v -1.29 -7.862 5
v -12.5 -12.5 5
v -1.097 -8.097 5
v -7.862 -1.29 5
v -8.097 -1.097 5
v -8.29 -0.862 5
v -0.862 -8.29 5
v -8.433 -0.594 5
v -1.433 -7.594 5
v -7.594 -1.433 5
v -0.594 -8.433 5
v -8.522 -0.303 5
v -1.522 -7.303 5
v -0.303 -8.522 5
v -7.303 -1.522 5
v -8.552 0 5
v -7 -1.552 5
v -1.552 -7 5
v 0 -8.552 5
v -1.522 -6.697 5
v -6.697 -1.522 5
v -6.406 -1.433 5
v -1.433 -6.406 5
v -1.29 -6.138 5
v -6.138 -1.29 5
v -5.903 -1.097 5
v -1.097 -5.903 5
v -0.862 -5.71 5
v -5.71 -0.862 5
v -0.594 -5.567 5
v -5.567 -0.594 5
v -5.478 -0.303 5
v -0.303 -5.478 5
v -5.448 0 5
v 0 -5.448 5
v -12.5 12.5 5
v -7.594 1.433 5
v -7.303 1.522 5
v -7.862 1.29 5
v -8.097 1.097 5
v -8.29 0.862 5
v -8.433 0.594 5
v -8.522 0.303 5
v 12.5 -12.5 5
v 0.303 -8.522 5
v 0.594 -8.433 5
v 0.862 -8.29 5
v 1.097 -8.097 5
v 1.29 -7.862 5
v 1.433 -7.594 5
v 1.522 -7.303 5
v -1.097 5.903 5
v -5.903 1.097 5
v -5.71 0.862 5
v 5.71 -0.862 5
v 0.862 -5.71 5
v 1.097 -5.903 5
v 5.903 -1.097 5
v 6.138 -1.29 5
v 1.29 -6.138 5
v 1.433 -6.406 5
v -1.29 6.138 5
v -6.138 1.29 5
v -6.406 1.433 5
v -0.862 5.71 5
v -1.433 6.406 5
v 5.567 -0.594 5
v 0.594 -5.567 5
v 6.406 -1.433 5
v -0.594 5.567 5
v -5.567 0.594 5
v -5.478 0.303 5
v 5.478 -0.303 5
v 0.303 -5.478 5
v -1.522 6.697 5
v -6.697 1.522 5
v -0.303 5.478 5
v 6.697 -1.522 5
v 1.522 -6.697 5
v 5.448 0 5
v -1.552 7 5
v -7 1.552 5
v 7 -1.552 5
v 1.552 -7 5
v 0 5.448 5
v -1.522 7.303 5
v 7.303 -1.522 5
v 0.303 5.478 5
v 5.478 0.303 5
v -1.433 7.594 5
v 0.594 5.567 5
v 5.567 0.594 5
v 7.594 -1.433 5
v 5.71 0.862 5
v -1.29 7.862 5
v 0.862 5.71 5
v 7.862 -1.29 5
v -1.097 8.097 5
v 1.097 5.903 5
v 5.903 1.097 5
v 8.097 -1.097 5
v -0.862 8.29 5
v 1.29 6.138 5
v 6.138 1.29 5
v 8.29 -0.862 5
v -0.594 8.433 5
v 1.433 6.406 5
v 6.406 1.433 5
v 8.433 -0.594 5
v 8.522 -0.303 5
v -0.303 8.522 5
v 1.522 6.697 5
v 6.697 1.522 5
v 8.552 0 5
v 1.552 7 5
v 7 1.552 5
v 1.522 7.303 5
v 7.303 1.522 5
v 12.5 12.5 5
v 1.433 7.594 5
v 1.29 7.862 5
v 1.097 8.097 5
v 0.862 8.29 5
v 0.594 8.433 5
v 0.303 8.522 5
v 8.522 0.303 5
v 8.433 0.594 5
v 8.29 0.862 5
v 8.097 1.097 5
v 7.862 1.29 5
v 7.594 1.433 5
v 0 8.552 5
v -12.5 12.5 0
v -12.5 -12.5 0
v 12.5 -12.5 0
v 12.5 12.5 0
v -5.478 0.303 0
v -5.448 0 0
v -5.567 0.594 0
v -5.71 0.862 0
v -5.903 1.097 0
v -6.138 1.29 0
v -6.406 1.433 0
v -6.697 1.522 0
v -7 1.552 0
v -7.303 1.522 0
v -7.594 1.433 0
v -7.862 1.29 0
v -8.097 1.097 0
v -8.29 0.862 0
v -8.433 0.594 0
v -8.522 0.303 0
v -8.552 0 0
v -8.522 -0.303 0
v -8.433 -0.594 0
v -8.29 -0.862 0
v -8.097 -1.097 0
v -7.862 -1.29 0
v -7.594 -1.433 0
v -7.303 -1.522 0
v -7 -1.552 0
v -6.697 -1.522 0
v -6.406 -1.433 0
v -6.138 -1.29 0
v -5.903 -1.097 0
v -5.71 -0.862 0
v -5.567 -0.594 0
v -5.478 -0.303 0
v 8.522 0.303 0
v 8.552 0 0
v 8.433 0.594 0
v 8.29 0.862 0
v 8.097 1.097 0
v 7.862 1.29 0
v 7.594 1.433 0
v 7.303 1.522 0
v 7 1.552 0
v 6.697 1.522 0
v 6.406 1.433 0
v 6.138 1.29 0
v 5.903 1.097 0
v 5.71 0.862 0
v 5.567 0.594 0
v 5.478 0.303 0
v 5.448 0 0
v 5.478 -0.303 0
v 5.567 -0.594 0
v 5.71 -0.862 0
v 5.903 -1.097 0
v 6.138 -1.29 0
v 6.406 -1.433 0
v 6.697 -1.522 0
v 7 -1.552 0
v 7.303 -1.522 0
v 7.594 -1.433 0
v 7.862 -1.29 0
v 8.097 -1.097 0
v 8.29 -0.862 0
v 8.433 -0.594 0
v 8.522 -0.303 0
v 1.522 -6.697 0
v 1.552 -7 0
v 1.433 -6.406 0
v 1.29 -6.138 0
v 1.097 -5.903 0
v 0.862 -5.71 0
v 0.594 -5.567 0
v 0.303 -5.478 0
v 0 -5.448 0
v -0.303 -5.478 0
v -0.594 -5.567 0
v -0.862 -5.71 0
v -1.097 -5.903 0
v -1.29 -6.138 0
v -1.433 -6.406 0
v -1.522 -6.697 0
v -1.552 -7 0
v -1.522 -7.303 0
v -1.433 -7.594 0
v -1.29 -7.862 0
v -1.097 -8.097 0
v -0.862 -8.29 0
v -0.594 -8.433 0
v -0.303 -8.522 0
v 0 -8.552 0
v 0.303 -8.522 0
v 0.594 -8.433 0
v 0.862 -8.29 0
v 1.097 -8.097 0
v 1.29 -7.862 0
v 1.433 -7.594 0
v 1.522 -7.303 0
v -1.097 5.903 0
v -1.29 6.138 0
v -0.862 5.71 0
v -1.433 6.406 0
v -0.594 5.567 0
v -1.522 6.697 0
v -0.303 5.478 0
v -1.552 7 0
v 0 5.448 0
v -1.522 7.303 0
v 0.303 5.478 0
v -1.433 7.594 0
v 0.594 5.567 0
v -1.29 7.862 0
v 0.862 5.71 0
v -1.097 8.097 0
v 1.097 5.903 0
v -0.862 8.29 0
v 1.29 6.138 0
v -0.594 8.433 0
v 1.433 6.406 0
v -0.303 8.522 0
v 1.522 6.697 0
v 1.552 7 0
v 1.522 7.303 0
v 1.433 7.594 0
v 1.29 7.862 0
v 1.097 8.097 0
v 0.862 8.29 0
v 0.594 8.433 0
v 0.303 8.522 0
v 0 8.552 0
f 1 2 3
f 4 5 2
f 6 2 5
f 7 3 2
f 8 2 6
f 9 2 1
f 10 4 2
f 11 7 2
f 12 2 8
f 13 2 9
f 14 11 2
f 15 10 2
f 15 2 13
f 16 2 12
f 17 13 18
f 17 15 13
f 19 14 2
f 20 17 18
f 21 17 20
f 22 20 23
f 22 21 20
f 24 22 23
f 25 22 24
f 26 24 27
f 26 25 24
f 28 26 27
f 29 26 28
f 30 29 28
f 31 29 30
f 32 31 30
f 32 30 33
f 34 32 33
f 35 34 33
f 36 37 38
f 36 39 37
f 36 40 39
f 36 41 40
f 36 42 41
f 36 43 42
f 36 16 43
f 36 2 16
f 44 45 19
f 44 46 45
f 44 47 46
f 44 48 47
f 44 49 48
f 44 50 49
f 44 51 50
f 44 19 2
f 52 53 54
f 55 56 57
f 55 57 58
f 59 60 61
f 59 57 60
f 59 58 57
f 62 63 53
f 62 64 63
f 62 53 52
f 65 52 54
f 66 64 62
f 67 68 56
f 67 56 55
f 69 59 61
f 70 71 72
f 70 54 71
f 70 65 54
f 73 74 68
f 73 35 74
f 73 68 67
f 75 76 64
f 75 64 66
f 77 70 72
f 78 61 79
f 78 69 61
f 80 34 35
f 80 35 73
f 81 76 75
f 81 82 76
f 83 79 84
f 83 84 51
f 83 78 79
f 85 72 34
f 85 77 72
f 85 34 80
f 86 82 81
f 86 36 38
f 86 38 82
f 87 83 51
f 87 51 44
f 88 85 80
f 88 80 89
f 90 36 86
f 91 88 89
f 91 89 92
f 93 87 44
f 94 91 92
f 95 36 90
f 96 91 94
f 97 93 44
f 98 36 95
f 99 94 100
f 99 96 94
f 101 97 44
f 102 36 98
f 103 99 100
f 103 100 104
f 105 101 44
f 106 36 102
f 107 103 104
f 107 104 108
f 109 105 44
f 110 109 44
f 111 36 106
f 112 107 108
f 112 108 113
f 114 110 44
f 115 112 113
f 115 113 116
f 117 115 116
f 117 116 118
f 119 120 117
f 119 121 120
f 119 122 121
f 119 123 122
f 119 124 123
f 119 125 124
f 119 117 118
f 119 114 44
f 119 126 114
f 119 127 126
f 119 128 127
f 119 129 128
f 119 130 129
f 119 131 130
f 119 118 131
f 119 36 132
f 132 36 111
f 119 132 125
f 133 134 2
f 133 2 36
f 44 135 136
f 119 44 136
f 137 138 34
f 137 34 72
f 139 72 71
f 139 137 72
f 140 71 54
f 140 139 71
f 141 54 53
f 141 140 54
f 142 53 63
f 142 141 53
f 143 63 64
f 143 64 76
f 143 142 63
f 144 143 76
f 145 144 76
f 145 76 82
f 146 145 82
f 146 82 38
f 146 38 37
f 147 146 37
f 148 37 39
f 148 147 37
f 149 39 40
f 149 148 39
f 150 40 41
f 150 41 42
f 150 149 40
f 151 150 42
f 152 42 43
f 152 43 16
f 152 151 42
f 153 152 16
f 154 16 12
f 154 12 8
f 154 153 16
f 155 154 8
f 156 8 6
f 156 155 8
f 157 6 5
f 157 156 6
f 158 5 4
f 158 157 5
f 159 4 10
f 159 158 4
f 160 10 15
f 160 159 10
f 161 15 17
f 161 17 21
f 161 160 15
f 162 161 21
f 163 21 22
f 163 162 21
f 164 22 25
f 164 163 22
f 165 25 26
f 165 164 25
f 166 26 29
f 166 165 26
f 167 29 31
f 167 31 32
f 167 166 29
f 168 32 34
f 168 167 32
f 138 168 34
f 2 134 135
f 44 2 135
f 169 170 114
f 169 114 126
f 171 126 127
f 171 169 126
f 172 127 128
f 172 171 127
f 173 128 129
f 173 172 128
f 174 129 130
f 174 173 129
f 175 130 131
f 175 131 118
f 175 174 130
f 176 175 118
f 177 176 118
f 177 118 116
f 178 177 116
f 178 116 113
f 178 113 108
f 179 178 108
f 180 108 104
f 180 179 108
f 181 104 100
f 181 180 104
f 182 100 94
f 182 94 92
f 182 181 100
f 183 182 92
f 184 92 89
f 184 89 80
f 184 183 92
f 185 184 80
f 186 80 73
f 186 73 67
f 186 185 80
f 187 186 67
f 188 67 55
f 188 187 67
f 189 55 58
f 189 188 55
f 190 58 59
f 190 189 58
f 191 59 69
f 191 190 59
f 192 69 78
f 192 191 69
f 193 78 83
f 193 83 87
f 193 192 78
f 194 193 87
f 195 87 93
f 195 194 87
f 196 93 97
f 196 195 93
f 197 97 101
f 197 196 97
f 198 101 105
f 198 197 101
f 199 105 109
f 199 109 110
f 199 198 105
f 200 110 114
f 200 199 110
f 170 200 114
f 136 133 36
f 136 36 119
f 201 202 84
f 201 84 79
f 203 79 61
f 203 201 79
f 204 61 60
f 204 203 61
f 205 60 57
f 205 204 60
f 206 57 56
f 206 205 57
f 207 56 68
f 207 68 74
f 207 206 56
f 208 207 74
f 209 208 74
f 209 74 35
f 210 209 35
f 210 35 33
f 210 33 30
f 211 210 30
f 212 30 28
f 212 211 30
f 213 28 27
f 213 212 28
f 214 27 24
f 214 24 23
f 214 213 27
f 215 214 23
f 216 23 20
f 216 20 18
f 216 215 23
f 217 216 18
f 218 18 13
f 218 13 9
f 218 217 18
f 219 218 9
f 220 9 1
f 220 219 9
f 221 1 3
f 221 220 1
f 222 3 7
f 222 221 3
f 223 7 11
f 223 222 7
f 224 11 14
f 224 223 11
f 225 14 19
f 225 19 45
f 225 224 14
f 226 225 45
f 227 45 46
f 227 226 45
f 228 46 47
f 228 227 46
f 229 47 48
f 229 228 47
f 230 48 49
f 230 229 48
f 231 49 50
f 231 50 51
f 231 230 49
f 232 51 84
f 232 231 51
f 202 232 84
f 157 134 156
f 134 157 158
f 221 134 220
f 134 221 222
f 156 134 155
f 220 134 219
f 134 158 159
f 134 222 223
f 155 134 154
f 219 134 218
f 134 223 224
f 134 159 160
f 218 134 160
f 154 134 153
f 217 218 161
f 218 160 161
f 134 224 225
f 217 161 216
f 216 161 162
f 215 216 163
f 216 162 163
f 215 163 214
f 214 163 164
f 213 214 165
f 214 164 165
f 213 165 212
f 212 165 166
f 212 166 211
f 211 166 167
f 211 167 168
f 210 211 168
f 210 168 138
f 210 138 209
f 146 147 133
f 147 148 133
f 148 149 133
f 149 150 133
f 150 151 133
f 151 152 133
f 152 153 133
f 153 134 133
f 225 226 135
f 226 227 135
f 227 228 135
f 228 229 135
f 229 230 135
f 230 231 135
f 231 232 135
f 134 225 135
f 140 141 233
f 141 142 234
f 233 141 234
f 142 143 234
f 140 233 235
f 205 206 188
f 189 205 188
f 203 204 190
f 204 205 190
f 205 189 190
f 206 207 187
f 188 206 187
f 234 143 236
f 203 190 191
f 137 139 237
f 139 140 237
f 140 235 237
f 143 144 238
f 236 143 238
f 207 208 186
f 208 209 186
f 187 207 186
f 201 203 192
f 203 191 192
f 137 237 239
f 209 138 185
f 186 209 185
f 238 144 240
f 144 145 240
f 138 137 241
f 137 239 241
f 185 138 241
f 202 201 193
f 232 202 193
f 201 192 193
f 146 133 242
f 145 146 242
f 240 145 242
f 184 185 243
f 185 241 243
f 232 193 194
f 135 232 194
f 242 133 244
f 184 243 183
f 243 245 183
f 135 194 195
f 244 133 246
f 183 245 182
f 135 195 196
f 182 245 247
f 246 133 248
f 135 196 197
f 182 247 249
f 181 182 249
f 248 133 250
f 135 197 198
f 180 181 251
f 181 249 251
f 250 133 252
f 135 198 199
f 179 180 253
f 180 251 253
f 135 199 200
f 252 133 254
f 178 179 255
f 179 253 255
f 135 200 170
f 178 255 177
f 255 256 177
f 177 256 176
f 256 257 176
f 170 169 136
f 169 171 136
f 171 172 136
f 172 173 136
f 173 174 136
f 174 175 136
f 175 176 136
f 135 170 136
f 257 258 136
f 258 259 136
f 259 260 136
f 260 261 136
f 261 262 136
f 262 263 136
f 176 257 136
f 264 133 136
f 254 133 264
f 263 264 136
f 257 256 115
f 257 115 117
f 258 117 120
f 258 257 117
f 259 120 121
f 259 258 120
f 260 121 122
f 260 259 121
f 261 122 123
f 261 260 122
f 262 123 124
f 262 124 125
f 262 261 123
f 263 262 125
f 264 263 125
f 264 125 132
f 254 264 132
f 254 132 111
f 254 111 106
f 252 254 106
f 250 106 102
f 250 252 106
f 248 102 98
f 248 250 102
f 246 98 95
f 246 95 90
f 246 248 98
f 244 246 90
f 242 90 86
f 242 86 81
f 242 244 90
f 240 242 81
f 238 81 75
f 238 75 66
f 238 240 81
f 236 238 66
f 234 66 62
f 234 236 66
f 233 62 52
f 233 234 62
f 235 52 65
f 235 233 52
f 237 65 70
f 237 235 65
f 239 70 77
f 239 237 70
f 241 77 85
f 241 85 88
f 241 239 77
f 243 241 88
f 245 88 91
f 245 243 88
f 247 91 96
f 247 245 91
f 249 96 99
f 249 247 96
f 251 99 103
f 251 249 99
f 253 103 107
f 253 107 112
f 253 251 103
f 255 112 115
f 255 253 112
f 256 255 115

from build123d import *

# Parameters (mm, degrees)
SKETCH1_W           = 25
SKETCH1_H           = 25
SKETCH1_R           = 1.5
SKETCH1_R_2         = 1.551537049
BOSS_EXTRUDE1_DEPTH = 5
SKETCH2_R           = 1.55
BOSS_EXTRUDE2_DEPTH = 5


with BuildPart() as part:
    # Sketch1 → Boss-Extrude1 (new body)
    with BuildSketch(Plane.XY):
        Rectangle(SKETCH1_W, SKETCH1_H)
        Circle(SKETCH1_R, mode=Mode.SUBTRACT)
        with Locations((0, 7)):
            Circle(SKETCH1_R_2, mode=Mode.SUBTRACT)
        with Locations((7, 0)):
            Circle(SKETCH1_R_2, mode=Mode.SUBTRACT)
        with Locations((0, -7)):
            Circle(SKETCH1_R_2, mode=Mode.SUBTRACT)
        with Locations((-7, 0)):
            Circle(SKETCH1_R_2, mode=Mode.SUBTRACT)
    extrude(amount=BOSS_EXTRUDE1_DEPTH)

    # Sketch2 → Boss-Extrude2 (add)
    with BuildSketch(Plane.XY.offset(5)):
        Circle(SKETCH2_R)
    extrude(amount=-BOSS_EXTRUDE2_DEPTH)


solid = part.part
